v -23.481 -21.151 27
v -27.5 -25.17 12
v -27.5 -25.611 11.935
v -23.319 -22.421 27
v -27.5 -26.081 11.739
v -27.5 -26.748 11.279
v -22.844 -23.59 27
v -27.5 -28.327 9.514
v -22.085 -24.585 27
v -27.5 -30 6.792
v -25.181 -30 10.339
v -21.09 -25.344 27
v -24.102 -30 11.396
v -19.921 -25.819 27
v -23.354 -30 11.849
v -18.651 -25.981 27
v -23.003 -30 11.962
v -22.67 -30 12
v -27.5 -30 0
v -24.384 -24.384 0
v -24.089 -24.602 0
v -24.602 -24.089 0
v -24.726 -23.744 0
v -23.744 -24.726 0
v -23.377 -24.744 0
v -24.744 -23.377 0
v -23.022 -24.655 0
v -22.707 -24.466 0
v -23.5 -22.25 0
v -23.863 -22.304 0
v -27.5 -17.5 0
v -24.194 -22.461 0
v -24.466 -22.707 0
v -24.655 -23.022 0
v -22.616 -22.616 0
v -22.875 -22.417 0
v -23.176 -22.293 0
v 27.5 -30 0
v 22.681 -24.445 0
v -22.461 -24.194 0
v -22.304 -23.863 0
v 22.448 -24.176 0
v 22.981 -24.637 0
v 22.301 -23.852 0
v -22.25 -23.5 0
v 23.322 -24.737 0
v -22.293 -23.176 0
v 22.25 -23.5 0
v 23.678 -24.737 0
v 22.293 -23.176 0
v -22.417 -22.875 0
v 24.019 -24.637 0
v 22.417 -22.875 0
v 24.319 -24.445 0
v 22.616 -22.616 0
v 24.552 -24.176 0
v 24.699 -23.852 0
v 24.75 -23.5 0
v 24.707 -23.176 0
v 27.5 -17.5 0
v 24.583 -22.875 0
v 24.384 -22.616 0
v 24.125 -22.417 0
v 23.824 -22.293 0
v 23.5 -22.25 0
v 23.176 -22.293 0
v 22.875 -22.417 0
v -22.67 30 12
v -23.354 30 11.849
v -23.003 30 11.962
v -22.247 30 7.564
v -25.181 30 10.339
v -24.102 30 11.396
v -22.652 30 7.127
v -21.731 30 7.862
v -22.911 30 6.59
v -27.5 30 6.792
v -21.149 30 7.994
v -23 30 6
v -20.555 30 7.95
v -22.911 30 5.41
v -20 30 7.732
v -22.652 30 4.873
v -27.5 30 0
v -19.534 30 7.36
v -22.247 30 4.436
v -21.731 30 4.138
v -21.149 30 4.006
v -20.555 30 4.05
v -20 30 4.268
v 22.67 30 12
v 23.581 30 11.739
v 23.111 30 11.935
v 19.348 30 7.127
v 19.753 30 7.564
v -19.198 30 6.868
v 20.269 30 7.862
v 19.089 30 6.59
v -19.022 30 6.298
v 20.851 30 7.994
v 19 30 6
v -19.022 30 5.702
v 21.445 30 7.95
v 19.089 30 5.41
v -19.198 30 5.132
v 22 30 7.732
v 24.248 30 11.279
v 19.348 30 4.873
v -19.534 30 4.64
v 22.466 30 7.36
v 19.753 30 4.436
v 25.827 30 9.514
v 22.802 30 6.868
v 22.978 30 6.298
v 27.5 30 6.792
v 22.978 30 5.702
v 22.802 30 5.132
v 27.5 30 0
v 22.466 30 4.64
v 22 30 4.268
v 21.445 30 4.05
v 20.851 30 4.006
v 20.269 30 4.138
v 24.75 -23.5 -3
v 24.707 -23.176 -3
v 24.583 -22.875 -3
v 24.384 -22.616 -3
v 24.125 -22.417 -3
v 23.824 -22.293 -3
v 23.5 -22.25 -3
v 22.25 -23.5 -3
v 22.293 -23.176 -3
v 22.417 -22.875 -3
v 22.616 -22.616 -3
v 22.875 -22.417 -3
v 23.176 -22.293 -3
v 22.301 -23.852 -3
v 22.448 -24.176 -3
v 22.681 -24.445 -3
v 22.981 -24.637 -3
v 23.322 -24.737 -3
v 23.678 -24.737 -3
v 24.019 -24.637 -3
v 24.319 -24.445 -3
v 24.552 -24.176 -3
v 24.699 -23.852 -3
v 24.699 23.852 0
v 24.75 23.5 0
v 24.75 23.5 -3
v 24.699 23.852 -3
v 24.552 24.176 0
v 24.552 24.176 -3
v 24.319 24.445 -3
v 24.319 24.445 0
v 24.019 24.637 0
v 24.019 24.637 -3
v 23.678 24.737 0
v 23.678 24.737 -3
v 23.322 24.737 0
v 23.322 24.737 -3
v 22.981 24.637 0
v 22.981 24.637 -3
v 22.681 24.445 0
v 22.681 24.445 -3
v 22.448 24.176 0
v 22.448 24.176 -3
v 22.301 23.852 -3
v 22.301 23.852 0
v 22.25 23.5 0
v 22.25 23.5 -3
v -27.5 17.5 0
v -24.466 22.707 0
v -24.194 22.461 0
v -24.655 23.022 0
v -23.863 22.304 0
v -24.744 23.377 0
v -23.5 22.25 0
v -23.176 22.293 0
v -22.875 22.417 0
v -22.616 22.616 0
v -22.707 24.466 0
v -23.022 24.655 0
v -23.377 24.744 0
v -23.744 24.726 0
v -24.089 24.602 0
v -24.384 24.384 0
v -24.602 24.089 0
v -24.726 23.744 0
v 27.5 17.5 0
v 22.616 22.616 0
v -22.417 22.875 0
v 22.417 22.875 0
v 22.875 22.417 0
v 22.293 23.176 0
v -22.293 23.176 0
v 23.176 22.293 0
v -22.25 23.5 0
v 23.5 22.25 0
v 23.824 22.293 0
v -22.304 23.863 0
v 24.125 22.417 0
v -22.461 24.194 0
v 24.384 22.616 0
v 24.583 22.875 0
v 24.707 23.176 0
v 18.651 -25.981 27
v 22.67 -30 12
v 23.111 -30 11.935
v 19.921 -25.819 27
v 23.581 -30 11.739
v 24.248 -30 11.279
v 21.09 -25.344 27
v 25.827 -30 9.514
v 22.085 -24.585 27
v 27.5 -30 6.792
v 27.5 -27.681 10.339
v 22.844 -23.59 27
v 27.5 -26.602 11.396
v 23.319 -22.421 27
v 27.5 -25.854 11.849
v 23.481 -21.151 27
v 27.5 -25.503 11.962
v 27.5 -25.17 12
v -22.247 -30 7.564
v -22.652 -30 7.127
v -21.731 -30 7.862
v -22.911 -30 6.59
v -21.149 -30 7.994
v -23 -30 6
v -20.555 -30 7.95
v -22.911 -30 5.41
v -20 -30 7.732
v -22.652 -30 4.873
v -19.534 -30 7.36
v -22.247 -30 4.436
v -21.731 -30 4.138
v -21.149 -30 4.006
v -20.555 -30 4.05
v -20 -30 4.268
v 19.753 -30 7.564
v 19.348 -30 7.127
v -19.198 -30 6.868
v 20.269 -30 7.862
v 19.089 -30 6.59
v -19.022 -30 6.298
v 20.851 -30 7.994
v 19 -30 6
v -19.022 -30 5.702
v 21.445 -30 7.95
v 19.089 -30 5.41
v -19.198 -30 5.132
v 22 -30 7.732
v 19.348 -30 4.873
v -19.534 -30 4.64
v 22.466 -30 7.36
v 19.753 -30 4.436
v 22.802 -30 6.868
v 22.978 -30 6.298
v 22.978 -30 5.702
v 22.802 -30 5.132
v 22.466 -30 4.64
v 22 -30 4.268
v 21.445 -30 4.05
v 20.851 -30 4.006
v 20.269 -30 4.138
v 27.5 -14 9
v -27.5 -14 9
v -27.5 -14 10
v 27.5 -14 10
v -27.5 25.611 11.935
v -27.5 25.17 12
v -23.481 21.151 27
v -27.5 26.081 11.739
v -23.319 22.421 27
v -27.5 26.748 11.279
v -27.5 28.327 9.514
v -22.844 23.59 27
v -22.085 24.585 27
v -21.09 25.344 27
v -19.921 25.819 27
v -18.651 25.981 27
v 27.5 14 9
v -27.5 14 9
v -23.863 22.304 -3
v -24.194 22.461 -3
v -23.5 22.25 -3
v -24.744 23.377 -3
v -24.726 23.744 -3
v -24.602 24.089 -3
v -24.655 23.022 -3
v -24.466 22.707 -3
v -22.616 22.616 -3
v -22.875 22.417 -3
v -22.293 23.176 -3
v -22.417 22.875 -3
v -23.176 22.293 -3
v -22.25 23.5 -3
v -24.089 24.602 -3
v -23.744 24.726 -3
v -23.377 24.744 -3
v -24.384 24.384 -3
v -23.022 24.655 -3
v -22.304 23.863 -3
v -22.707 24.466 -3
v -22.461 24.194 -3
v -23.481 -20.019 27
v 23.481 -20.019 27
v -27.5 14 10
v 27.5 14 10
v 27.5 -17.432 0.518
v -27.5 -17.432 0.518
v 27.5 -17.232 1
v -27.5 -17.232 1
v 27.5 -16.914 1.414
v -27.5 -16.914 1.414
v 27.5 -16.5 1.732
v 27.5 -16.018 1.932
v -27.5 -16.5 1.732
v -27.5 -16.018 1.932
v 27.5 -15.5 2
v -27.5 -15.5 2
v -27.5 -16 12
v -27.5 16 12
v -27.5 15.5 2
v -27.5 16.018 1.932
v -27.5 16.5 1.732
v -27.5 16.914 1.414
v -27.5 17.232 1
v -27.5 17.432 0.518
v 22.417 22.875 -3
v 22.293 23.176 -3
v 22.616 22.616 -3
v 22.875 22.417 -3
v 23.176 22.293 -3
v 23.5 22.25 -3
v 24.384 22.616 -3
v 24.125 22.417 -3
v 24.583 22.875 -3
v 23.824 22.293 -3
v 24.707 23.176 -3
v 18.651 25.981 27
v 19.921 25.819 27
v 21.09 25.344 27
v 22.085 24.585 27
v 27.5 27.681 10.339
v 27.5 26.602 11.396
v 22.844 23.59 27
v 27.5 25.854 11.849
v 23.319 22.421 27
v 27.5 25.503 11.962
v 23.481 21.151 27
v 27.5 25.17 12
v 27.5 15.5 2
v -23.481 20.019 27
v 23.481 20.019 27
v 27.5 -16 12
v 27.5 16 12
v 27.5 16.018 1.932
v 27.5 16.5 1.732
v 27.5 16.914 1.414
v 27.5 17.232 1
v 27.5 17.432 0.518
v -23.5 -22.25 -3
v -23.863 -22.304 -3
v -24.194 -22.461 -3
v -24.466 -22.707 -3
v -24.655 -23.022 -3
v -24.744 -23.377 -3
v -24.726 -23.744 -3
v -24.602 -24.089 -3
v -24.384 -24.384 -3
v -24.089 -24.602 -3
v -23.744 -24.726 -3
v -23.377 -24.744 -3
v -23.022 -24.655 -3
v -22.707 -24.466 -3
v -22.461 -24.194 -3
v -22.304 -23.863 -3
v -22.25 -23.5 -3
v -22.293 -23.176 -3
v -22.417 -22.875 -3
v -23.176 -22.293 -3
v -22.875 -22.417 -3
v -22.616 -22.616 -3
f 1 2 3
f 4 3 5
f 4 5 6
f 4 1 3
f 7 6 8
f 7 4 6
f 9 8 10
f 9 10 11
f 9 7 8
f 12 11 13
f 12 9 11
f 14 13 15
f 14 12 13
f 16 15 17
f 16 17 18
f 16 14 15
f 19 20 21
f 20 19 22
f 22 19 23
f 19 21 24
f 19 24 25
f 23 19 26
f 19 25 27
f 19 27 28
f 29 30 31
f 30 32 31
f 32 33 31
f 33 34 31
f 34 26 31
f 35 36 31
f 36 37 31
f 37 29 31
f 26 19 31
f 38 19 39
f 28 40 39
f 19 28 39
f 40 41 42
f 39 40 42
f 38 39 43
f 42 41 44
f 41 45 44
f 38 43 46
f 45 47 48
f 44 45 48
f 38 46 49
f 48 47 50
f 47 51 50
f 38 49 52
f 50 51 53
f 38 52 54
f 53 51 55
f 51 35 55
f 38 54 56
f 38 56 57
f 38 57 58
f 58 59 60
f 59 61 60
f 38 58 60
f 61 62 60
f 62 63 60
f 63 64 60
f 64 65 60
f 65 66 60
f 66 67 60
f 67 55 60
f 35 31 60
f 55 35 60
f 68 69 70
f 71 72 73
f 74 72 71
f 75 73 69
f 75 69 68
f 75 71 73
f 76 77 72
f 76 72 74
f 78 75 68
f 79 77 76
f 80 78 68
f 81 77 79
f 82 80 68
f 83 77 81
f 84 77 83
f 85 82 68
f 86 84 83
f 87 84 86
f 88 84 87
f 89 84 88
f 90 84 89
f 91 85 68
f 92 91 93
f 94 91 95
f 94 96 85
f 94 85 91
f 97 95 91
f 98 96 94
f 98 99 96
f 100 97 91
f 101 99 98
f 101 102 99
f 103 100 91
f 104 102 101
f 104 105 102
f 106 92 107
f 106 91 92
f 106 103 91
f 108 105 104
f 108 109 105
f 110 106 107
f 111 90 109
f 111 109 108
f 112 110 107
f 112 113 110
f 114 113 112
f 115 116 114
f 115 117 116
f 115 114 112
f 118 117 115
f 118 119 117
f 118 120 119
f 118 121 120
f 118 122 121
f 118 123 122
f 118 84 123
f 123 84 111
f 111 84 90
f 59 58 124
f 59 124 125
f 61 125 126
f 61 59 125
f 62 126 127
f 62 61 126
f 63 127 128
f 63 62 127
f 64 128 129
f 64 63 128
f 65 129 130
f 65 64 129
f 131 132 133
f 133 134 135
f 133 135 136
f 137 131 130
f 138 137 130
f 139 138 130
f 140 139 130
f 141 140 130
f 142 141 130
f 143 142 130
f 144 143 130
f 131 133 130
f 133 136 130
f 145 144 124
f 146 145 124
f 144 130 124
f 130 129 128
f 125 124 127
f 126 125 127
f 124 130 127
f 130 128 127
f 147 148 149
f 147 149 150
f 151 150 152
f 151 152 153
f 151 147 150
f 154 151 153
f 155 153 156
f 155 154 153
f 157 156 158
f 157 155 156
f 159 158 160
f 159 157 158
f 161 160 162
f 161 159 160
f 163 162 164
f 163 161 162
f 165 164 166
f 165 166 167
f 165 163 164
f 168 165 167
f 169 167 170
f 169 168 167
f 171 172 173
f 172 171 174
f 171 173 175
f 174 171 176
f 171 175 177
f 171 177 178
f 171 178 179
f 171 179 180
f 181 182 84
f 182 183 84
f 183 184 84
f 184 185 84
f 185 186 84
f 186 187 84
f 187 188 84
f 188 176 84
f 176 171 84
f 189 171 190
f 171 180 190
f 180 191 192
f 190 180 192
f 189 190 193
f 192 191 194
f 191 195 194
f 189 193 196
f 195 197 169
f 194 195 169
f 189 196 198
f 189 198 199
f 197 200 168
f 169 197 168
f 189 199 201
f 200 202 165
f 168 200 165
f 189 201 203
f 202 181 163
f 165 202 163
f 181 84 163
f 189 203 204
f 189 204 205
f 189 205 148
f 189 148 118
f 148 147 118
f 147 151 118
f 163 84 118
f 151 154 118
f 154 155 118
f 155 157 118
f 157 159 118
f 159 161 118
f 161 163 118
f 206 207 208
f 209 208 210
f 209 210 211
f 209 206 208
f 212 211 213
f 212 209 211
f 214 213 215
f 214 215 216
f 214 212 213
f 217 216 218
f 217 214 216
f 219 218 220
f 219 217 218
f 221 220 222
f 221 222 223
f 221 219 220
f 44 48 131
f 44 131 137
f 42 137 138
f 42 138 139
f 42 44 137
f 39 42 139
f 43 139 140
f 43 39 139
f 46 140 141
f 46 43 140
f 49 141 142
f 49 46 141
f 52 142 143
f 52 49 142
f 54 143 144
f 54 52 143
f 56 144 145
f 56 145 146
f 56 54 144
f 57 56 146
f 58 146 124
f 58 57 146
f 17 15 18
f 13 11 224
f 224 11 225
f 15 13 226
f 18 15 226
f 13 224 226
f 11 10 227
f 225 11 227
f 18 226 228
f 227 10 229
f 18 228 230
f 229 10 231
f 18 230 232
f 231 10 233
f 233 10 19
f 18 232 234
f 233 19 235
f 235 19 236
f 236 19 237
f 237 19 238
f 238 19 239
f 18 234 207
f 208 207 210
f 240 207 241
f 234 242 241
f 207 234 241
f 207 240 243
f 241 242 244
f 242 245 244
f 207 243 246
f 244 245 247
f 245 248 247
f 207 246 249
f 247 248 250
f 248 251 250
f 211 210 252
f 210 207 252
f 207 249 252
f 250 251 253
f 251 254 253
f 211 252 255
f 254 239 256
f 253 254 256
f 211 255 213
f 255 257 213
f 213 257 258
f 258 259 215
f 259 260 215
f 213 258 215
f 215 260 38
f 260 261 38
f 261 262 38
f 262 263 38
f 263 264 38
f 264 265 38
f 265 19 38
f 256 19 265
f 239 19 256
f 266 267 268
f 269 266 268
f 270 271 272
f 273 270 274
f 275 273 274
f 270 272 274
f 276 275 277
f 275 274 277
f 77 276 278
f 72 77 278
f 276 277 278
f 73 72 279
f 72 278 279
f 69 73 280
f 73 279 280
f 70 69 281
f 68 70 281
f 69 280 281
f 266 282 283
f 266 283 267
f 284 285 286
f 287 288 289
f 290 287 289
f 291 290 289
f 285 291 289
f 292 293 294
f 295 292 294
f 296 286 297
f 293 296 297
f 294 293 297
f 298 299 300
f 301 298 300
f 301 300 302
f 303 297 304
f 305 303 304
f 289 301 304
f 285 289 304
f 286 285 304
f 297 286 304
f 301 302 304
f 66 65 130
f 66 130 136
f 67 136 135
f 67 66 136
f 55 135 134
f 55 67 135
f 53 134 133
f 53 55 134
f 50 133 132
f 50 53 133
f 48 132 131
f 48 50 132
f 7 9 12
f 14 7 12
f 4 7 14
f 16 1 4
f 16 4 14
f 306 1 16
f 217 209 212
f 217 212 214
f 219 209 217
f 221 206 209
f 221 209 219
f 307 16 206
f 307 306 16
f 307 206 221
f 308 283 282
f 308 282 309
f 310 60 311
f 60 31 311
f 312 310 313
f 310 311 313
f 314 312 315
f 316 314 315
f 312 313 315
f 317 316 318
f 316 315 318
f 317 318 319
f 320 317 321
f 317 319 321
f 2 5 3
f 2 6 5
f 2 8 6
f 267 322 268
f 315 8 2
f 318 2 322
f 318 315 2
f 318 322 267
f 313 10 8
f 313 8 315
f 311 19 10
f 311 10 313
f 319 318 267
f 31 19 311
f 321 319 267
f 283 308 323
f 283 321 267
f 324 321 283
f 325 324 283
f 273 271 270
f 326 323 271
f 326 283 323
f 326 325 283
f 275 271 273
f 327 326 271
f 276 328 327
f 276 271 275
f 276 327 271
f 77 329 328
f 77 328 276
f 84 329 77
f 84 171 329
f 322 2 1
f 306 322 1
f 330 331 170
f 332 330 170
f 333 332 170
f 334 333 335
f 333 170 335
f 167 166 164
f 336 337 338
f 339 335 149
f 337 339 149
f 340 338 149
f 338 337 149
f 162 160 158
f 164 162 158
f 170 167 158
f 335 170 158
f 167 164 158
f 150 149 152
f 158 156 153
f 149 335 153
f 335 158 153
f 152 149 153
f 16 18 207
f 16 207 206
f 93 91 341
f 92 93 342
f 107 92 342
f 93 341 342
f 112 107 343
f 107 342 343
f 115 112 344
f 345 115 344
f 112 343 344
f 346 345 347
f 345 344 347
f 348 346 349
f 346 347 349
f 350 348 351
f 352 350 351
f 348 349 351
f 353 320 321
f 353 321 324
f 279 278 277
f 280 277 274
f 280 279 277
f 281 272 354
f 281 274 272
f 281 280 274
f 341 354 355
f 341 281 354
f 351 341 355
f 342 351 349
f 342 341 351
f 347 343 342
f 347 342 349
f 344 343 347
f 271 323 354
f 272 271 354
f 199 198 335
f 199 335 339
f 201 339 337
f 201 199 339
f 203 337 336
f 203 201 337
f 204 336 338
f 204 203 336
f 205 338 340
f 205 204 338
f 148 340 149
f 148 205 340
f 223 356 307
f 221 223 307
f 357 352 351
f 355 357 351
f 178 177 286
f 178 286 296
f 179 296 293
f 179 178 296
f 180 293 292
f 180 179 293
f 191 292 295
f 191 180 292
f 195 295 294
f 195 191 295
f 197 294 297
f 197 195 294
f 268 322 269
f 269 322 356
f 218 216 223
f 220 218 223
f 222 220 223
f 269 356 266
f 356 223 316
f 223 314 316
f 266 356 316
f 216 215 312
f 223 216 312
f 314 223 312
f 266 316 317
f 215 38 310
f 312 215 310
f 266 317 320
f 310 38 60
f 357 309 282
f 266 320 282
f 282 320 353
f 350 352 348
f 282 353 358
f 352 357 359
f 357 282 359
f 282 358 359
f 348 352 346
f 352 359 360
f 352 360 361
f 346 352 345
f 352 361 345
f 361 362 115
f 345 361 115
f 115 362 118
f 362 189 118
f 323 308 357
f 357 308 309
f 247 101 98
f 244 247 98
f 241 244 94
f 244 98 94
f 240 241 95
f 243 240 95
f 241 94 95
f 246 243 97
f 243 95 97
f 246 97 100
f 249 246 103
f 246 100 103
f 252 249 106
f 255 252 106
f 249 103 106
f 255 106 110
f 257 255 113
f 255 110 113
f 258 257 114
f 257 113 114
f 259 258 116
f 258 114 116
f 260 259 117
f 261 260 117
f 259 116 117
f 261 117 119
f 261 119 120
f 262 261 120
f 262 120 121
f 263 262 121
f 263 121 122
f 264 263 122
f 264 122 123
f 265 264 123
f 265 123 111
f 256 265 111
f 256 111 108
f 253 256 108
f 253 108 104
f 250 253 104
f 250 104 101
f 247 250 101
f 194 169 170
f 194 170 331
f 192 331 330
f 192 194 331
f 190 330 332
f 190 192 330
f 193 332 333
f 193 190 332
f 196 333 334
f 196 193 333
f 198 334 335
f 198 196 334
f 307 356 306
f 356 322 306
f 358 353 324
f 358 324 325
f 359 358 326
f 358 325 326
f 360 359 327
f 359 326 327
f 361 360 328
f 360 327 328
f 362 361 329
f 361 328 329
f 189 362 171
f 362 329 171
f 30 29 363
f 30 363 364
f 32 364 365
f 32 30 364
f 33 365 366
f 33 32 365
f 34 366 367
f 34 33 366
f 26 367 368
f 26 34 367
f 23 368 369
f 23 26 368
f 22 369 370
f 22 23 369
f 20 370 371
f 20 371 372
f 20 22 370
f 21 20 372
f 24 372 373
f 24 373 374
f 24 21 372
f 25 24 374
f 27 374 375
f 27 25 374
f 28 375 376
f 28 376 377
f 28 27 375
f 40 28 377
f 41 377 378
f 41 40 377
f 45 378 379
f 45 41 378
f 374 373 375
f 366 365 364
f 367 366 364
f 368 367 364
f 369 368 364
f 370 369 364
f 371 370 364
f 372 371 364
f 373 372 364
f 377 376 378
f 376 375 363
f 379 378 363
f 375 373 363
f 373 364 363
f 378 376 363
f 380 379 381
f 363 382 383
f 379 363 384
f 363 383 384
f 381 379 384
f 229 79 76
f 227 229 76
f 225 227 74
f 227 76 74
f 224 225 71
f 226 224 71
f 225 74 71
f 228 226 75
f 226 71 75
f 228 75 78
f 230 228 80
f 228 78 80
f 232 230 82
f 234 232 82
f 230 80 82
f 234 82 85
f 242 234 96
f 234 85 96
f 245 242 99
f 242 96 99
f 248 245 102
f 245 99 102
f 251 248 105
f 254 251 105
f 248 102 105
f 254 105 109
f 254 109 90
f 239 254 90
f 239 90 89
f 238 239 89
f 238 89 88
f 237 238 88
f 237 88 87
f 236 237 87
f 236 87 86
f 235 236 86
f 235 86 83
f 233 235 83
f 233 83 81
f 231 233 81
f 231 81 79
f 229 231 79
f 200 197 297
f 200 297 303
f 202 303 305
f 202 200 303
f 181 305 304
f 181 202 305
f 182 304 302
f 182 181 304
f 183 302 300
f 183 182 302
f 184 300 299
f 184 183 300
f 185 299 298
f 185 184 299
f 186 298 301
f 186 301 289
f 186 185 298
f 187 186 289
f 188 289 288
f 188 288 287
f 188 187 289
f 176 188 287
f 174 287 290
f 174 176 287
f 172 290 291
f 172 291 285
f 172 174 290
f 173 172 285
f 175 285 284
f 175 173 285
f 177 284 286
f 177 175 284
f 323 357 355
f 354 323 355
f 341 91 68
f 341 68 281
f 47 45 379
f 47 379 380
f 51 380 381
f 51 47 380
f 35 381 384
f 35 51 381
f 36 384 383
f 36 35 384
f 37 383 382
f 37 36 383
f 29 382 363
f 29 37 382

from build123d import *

# Parameters (mm, degrees)
F0_W      = 55
F0_H      = 60
F1_DEPTH  = 12
F2_DEPTH  = 3
F3_W      = 35
F3_H      = 2
F4_DEPTH  = 56.75
F5_R      = 1.99999
F6_R      = 2
F7_DEPTH  = 63.75
F8_W      = 28
F8_H      = 3
F9_DEPTH  = 57.25
F10_SIZE  = 2
F9_FACE_W = 55
F9_FACE_H = 14
F11_DEPTH = 15
F11_TAPER = 15
F12_R     = 5


# Not quite as in the source:
# - a fillet or chamfer is up to 0.001 mm smaller than in the source, because OpenCascade refuses the exact size


with BuildPart() as f1:
    # F0 (on Top) → F1 (new body)
    with BuildSketch(Plane.XY):
        Rectangle(F0_W, F0_H)
        with BuildLine():
            ThreePointArc((-23.5, 22.25), (-24.3838834765, 24.3838834765), (-22.25, 23.5))
            Line((-22.25, 23.5), (22.25, 23.5))
            ThreePointArc((22.25, 23.5), (23.5, 24.75), (24.75, 23.5))
            ThreePointArc((24.75, 23.5), (24.3838834765, 22.6161165235), (23.5, 22.25))
            Line((23.5, 22.25), (23.5, -22.25))
            ThreePointArc((23.5, -22.25), (24.3838834765, -22.6161165235), (24.75, -23.5))
            ThreePointArc((24.75, -23.5), (23.5, -24.75), (22.25, -23.5))
            Line((22.25, -23.5), (-22.25, -23.5))
            ThreePointArc((-22.25, -23.5), (-24.3838834765, -24.3838834765), (-23.5, -22.25))
            Line((-23.5, -22.25), (-23.5, 22.25))
        make_face(mode=Mode.SUBTRACT)
        with BuildLine():
            Line((22.25, 23.5), (-22.25, 23.5))
            ThreePointArc((-22.25, 23.5), (-22.6161165235, 22.6161165235), (-23.5, 22.25))
            Line((-23.5, 22.25), (-23.5, -22.25))
            ThreePointArc((-23.5, -22.25), (-22.6161165235, -22.6161165235), (-22.25, -23.5))
            Line((-22.25, -23.5), (22.25, -23.5))
            ThreePointArc((22.25, -23.5), (22.6161165235, -22.6161165235), (23.5, -22.25))
            Line((23.5, -22.25), (23.5, 22.25))
            ThreePointArc((23.5, 22.25), (22.6161165235, 22.6161165235), (22.25, 23.5))
        make_face()
        with BuildLine():
            Line((-23.5, 22.25), (-23.5, 23.5))
            Line((-23.5, 23.5), (-22.25, 23.5))
            ThreePointArc((-22.25, 23.5), (-24.3838834765, 24.3838834765), (-23.5, 22.25))
        make_face()
        with BuildLine():
            Line((-22.25, 23.5), (-23.5, 23.5))
            Line((-23.5, 23.5), (-23.5, 22.25))
            ThreePointArc((-23.5, 22.25), (-22.6161165235, 22.6161165235), (-22.25, 23.5))
        make_face()
        with BuildLine():
            ThreePointArc((24.75, 23.5), (23.5, 24.75), (22.25, 23.5))
            Line((22.25, 23.5), (23.5, 23.5))
            Line((23.5, 23.5), (23.5, 22.25))
            ThreePointArc((23.5, 22.25), (24.3838834765, 22.6161165235), (24.75, 23.5))
        make_face()
        with BuildLine():
            Line((23.5, 23.5), (22.25, 23.5))
            ThreePointArc((22.25, 23.5), (22.6161165235, 22.6161165235), (23.5, 22.25))
            Line((23.5, 22.25), (23.5, 23.5))
        make_face()
        with BuildLine():
            ThreePointArc((24.75, -23.5), (24.3838834765, -22.6161165235), (23.5, -22.25))
            Line((23.5, -22.25), (23.5, -23.5))
            Line((23.5, -23.5), (22.25, -23.5))
            ThreePointArc((22.25, -23.5), (23.5, -24.75), (24.75, -23.5))
        make_face()
        with BuildLine():
            Line((23.5, -23.5), (23.5, -22.25))
            ThreePointArc((23.5, -22.25), (22.6161165235, -22.6161165235), (22.25, -23.5))
            Line((22.25, -23.5), (23.5, -23.5))
        make_face()
        with BuildLine():
            Line((-23.5, -23.5), (-23.5, -22.25))
            ThreePointArc((-23.5, -22.25), (-24.3838834765, -24.3838834765), (-22.25, -23.5))
            Line((-22.25, -23.5), (-23.5, -23.5))
        make_face()
        with BuildLine():
            ThreePointArc((-22.25, -23.5), (-22.6161165235, -22.6161165235), (-23.5, -22.25))
            Line((-23.5, -22.25), (-23.5, -23.5))
            Line((-23.5, -23.5), (-22.25, -23.5))
        make_face()
    extrude(amount=F1_DEPTH)

    # F0 (on Top) → F2 (join)
    with BuildSketch(Plane.XY):
        with BuildLine():
            Line((-23.5, 22.25), (-23.5, 23.5))
            Line((-23.5, 23.5), (-22.25, 23.5))
            ThreePointArc((-22.25, 23.5), (-24.3838834765, 24.3838834765), (-23.5, 22.25))
        make_face()
        with BuildLine():
            Line((-22.25, 23.5), (-23.5, 23.5))
            Line((-23.5, 23.5), (-23.5, 22.25))
            ThreePointArc((-23.5, 22.25), (-22.6161165235, 22.6161165235), (-22.25, 23.5))
        make_face()
        with BuildLine():
            Line((-23.5, -23.5), (-23.5, -22.25))
            ThreePointArc((-23.5, -22.25), (-24.3838834765, -24.3838834765), (-22.25, -23.5))
            Line((-22.25, -23.5), (-23.5, -23.5))
        make_face()
        with BuildLine():
            ThreePointArc((-22.25, -23.5), (-22.6161165235, -22.6161165235), (-23.5, -22.25))
            Line((-23.5, -22.25), (-23.5, -23.5))
            Line((-23.5, -23.5), (-22.25, -23.5))
        make_face()
        with BuildLine():
            ThreePointArc((24.75, -23.5), (24.3838834765, -22.6161165235), (23.5, -22.25))
            Line((23.5, -22.25), (23.5, -23.5))
            Line((23.5, -23.5), (22.25, -23.5))
            ThreePointArc((22.25, -23.5), (23.5, -24.75), (24.75, -23.5))
        make_face()
        with BuildLine():
            Line((23.5, -23.5), (23.5, -22.25))
            ThreePointArc((23.5, -22.25), (22.6161165235, -22.6161165235), (22.25, -23.5))
            Line((22.25, -23.5), (23.5, -23.5))
        make_face()
        with BuildLine():
            ThreePointArc((24.75, 23.5), (23.5, 24.75), (22.25, 23.5))
            Line((22.25, 23.5), (23.5, 23.5))
            Line((23.5, 23.5), (23.5, 22.25))
            ThreePointArc((23.5, 22.25), (24.3838834765, 22.6161165235), (24.75, 23.5))
        make_face()
        with BuildLine():
            Line((23.5, 23.5), (22.25, 23.5))
            ThreePointArc((22.25, 23.5), (22.6161165235, 22.6161165235), (23.5, 22.25))
            Line((23.5, 22.25), (23.5, 23.5))
        make_face()
    extrude(amount=-F2_DEPTH)

    # F3 (on face) → F4 (cut)
    with BuildSketch(Plane.YZ.offset(27.5)):
        with Locations((0, 1)):
            Rectangle(F3_W, F3_H)
    extrude(amount=-F4_DEPTH, mode=Mode.SUBTRACT)

    # F5 (radius 2 in the source; OpenCascade refuses exactly that, so slightly less here)
    f5_edges = [f1.edges().sort_by_distance(p)[0] for p in [
        (0, -17.5, 2),
        (0, 17.5, 2),
    ]]
    fillet(f5_edges, radius=F5_R)

    # F6 (on face) → F7 (cut)
    with BuildSketch(Plane(origin=(0, 30, 0), x_dir=(-1, 0, 0), z_dir=(0, 1, 0))):
        with Locations((-21, 6)):
            Circle(F6_R)
        with Locations((21, 6)):
            Circle(F6_R)
    extrude(amount=-F7_DEPTH, mode=Mode.SUBTRACT)

    # F8 (on face) → F9 (cut)
    with BuildSketch(Plane(origin=(-27.5, 0, 0), x_dir=(0, -1, 0), z_dir=(-1, 0, 0))):
        with Locations((0, 10.5)):
            Rectangle(F8_W, F8_H)
    extrude(amount=-F9_DEPTH, mode=Mode.SUBTRACT)

    # F10
    f10_edges = [f1.edges().sort_by_distance(p)[0] for p in [
        (0, -14, 12),
        (0, 14, 12),
    ]]
    chamfer(f10_edges, length=F10_SIZE)

    # F9_face (on face) → F11 (join)
    with BuildSketch(Plane(origin=(0, 23, 12), x_dir=(1, 0, 0), z_dir=(0, 0, 1))):
        Rectangle(F9_FACE_W, F9_FACE_H)
        with Locations((0, -46)):
            Rectangle(F9_FACE_W, F9_FACE_H)
    extrude(amount=F11_DEPTH, taper=F11_TAPER)

    # F12
    f12_edges = [f1.edges().sort_by_distance(p)[0] for p in [
        (-25.490381, 27.990381, 19.5),
        (25.490381, 27.990381, 19.5),
        (-25.490381, -27.990381, 19.5),
        (25.490381, -27.990381, 19.5),
    ]]
    fillet(f12_edges, radius=F12_R)


solid = f1.part
